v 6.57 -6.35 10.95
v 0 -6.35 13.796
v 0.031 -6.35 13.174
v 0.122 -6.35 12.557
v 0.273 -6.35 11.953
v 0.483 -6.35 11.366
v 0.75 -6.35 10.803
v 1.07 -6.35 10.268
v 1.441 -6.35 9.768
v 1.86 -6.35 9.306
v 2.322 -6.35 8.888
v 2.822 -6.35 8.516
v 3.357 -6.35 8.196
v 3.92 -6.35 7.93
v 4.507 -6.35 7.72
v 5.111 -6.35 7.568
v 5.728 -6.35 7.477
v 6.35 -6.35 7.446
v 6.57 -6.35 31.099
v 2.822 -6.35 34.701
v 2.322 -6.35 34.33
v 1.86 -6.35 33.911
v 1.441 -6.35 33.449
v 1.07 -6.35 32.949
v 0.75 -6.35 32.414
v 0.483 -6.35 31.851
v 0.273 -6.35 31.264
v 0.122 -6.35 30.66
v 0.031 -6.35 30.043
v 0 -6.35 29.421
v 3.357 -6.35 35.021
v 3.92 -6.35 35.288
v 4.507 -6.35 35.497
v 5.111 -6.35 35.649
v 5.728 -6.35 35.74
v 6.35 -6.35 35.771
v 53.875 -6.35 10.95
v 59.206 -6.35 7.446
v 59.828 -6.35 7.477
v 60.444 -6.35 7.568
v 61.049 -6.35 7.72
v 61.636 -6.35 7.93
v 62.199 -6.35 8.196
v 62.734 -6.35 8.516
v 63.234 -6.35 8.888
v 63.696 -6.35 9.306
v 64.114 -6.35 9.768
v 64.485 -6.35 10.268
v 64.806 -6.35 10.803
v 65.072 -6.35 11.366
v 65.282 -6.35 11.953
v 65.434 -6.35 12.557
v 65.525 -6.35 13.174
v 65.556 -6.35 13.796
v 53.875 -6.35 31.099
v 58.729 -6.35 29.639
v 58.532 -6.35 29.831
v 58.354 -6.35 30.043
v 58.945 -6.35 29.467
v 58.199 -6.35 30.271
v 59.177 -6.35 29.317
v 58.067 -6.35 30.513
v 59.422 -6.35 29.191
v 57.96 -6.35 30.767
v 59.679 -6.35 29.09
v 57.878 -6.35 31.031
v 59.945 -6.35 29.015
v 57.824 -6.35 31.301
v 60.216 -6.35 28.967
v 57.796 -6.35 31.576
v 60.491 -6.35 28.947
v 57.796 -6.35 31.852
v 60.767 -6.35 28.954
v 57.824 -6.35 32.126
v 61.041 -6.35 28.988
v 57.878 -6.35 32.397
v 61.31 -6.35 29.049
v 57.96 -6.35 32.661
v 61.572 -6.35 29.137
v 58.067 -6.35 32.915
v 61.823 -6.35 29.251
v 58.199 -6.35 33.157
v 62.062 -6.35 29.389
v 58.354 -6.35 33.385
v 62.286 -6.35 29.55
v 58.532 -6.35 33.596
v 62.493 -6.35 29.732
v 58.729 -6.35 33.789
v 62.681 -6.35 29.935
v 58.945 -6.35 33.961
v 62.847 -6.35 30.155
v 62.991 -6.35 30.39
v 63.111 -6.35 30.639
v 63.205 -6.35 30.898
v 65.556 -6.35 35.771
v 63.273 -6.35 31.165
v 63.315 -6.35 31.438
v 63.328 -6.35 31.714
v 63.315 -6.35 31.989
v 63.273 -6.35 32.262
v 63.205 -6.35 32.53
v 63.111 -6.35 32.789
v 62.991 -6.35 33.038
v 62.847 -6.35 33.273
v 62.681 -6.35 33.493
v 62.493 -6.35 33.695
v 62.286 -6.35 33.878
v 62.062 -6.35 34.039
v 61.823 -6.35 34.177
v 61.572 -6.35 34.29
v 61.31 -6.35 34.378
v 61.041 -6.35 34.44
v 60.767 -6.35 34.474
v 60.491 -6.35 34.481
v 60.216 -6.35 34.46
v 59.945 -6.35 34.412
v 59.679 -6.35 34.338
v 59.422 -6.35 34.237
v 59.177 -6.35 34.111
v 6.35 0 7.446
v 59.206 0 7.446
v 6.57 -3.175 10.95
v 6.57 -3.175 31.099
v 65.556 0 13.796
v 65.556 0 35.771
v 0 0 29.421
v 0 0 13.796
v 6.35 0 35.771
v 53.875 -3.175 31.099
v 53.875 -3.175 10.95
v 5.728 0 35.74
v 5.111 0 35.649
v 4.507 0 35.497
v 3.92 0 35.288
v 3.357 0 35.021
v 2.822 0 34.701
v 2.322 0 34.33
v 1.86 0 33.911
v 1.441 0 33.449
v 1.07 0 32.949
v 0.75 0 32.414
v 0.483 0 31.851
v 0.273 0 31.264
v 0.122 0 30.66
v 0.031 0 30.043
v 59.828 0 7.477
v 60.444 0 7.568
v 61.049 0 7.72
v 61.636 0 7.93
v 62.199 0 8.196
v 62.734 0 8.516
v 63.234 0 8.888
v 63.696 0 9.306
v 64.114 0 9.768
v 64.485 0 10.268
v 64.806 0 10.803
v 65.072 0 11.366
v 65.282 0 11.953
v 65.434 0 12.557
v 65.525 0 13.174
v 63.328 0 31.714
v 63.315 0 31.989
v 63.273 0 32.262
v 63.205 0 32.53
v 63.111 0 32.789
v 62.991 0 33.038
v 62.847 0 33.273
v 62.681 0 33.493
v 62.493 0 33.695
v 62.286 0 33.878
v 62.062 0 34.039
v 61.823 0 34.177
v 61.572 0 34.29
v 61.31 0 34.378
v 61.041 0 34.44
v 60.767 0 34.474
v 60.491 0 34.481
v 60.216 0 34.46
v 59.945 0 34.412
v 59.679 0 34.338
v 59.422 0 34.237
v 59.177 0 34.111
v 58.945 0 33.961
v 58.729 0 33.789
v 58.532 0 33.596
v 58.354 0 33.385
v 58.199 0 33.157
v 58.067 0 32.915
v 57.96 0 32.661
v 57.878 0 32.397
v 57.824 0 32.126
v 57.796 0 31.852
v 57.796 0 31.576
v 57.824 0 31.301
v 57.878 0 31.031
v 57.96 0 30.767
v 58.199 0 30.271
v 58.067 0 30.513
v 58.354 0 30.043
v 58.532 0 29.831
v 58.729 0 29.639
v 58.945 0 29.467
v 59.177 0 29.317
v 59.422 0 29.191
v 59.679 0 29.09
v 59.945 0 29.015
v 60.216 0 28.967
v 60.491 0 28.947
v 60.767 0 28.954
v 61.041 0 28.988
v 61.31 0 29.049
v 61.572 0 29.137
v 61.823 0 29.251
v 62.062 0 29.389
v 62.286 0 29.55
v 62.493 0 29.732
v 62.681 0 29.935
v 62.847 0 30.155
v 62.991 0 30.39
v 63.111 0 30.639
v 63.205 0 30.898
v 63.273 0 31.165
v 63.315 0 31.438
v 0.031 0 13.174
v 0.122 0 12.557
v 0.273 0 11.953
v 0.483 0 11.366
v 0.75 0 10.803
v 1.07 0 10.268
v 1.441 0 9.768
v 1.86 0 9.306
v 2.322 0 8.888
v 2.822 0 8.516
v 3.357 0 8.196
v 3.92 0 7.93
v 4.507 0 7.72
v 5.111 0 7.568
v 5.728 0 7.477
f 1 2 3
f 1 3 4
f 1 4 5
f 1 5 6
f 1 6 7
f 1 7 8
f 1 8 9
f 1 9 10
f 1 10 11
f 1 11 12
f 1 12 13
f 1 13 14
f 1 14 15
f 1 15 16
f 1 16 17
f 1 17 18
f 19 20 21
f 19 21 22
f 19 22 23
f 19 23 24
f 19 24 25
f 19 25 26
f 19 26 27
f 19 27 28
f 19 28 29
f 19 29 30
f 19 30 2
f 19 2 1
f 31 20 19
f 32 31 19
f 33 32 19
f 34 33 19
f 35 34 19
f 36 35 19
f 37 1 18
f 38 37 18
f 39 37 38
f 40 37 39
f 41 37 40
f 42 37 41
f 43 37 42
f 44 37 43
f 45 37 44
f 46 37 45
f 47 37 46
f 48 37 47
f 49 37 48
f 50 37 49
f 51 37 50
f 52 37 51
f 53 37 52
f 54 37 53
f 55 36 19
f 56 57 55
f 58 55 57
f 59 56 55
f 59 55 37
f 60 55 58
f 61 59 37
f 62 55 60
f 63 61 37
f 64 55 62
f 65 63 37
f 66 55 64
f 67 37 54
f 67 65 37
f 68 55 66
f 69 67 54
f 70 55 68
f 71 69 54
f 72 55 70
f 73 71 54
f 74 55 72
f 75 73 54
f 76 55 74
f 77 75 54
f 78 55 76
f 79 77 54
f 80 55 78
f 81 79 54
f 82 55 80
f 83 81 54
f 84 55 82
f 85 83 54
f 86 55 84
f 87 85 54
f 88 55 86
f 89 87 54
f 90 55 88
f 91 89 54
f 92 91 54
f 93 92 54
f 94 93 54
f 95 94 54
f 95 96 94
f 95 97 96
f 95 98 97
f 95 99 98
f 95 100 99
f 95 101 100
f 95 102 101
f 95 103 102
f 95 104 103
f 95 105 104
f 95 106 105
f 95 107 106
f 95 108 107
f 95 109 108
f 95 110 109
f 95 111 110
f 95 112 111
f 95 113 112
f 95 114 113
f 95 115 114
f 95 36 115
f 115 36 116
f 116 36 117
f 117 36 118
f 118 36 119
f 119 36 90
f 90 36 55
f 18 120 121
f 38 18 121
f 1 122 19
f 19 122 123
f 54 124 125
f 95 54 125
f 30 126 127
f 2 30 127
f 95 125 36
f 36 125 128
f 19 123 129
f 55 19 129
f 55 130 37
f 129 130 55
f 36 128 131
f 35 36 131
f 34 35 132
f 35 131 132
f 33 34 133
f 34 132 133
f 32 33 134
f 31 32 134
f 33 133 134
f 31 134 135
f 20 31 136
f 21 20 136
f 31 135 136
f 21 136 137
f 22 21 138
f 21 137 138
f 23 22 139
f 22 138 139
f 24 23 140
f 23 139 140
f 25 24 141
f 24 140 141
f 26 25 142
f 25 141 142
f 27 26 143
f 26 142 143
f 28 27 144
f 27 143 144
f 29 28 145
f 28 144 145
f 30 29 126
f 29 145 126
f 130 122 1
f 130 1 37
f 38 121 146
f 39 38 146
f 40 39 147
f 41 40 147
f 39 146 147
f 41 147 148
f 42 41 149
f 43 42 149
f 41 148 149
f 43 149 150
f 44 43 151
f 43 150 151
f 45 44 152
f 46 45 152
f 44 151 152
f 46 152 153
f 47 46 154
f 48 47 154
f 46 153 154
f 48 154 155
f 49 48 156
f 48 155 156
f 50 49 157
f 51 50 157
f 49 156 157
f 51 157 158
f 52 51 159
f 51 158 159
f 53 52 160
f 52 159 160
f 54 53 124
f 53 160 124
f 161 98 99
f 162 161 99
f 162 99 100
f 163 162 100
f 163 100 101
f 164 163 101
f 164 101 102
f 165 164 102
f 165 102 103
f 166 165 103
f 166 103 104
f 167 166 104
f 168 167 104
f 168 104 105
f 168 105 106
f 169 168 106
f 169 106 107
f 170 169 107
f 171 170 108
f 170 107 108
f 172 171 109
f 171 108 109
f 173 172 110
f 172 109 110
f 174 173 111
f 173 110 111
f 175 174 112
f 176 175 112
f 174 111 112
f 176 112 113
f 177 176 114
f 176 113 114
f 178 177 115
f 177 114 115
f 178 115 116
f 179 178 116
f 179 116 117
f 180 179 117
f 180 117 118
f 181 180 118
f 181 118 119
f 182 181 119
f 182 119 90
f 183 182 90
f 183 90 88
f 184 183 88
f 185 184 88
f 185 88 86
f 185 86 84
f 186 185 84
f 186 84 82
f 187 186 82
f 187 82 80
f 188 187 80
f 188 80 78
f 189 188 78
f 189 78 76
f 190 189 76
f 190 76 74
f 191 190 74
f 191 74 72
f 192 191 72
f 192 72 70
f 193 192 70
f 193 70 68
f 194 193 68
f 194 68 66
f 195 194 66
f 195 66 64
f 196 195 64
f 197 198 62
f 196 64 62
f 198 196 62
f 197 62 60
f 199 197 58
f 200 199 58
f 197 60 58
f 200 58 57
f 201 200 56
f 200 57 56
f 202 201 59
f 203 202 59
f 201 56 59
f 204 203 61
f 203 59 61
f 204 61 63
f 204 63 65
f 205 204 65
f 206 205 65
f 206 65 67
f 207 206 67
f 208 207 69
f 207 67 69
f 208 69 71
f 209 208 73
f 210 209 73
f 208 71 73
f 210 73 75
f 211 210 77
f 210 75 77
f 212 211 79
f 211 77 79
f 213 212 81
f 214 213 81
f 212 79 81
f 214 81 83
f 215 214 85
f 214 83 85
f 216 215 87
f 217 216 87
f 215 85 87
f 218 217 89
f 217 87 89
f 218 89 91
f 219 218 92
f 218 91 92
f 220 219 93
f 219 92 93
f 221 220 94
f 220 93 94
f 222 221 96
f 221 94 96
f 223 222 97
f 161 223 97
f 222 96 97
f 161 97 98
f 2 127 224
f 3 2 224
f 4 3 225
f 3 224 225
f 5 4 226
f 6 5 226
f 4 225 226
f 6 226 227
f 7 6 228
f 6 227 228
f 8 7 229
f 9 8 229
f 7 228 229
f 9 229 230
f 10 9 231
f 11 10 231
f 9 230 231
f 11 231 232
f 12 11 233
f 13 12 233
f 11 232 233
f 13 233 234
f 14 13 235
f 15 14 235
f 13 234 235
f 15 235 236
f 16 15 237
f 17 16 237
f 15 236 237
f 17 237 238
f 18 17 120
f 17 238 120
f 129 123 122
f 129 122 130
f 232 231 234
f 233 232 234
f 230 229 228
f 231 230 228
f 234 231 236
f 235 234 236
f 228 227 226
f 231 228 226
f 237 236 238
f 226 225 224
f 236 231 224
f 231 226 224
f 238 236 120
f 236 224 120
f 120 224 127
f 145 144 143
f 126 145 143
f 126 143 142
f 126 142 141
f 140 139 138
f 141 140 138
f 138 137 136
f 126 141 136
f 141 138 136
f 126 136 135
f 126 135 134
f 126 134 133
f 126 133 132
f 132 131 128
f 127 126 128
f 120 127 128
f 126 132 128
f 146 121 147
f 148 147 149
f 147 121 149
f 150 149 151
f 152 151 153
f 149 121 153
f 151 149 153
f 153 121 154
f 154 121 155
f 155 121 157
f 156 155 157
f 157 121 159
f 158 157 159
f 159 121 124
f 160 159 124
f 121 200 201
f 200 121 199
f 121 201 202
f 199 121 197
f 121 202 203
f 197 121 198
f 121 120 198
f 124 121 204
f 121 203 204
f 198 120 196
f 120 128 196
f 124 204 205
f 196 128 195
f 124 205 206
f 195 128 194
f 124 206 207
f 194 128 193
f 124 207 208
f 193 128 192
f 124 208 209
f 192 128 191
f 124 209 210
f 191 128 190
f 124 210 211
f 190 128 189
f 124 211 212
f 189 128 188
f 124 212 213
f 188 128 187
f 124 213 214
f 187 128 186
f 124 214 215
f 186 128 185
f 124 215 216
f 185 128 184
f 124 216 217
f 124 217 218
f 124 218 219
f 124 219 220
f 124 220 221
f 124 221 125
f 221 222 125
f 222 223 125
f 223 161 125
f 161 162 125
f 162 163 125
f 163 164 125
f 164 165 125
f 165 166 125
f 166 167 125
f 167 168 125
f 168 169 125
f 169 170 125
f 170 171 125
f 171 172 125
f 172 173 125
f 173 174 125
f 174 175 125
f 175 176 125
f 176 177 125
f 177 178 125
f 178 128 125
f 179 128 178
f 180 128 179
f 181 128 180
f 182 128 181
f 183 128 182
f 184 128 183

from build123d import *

# Parameters (mm, degrees)
F0_W     = 47.305181
F0_H     = 20.148503
F1_DEPTH = 6.35
F2_DEPTH = 3.175
F3_R     = 2.767863
F4_DEPTH = 25.4


with BuildPart() as f1:
    # F0 (on Front) → F1 (new body)
    with BuildSketch(Plane.XZ):
        with BuildLine():
            Line((65.55564, 35.770893), (6.35, 35.770893))
            ThreePointArc((6.35, 35.770893), (1.859872, 33.911021), (0, 29.420893))
            Line((0, 29.420893), (0, 13.796186))
            ThreePointArc((0, 13.796186), (1.859872, 9.306058), (6.35, 7.446186))
            Line((6.35, 7.446186), (59.20564, 7.446186))
            ThreePointArc((59.20564, 7.446186), (63.695768, 9.306058), (65.55564, 13.796186))
            Line((65.55564, 13.796186), (65.55564, 35.770893))
        make_face()
        with Locations((30.222755, 21.024525)):
            Rectangle(F0_W, F0_H, mode=Mode.SUBTRACT)
    extrude(amount=F1_DEPTH)

    # F0 (on Front) → F2 (join)
    with BuildSketch(Plane.XZ):
        with Locations((30.222755, 21.024525)):
            Rectangle(F0_W, F0_H)
    extrude(amount=F2_DEPTH)

    # F3 (on face) → F4 (cut)
    with BuildSketch(Plane.XZ.offset(6.35)):
        with Locations((60.560498, 31.713862)):
            Circle(F3_R)
    extrude(amount=-F4_DEPTH, mode=Mode.SUBTRACT)


solid = f1.part
